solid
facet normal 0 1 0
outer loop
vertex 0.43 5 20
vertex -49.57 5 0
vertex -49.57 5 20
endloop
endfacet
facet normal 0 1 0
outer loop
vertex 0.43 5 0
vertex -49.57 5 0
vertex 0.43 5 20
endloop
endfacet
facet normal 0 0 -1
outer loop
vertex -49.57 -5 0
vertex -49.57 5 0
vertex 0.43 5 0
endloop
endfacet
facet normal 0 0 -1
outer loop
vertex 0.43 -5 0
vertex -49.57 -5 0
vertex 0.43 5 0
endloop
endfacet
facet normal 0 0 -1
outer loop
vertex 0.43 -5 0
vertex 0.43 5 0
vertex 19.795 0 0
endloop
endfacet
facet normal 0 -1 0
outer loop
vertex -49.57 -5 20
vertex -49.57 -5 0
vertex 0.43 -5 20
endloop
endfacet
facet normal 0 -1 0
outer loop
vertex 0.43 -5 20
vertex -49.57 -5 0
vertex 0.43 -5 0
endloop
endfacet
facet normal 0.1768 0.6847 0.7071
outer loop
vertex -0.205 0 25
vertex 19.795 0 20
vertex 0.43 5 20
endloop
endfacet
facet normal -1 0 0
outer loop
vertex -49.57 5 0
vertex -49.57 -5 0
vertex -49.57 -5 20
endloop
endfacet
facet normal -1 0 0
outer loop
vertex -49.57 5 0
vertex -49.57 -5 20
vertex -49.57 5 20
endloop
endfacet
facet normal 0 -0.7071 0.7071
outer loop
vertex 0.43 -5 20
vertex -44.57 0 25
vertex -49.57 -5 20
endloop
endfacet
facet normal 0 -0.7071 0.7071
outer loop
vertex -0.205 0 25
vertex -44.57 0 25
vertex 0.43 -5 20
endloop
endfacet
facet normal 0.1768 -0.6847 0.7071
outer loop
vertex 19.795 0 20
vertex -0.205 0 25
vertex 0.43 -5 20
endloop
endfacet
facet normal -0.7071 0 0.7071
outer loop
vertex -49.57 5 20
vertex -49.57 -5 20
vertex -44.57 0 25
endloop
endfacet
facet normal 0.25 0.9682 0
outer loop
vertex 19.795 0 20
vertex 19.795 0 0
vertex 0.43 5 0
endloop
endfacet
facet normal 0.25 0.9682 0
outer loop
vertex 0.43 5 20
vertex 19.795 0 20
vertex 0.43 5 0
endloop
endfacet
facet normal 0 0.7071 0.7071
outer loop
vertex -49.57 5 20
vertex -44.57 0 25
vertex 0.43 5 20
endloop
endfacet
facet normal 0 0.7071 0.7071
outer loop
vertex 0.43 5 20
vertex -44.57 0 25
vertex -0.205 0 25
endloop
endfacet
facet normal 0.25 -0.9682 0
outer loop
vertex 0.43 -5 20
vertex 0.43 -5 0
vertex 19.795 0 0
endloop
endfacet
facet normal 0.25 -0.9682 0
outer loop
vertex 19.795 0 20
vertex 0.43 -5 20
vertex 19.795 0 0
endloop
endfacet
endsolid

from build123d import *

# Parameters (mm, degrees)
F0_W     = 50
F0_H     = 10
F1_DEPTH = 25
F2_SIZE  = 4.99999


# Not quite as in the source:
# - a fillet or chamfer is up to 0.001 mm smaller than in the source, because OpenCascade refuses the exact size


with BuildPart() as f1:
    # F0 (on Top) → F1 (new body)
    with BuildSketch(Plane.XY):
        with Locations((-24.5698342215, 0)):
            Rectangle(F0_W, F0_H)
        Polygon((0.4301657785, 5), (0.4301657785, -5), (19.7950825095, 0), align=None)
    extrude(amount=F1_DEPTH)

    # F2 (size 5 in the source; OpenCascade refuses exactly that, so slightly less here)
    f2_edges = [f1.edges().sort_by_distance(p)[0] for p in [
        (-24.569834, -5, 25),
        (-49.569834, 0, 25),
        (-24.569834, 5, 25),
        (10.112624, 2.5, 25),
        (10.112624, -2.5, 25),
    ]]
    chamfer(f2_edges, length=F2_SIZE)


solid = f1.part
